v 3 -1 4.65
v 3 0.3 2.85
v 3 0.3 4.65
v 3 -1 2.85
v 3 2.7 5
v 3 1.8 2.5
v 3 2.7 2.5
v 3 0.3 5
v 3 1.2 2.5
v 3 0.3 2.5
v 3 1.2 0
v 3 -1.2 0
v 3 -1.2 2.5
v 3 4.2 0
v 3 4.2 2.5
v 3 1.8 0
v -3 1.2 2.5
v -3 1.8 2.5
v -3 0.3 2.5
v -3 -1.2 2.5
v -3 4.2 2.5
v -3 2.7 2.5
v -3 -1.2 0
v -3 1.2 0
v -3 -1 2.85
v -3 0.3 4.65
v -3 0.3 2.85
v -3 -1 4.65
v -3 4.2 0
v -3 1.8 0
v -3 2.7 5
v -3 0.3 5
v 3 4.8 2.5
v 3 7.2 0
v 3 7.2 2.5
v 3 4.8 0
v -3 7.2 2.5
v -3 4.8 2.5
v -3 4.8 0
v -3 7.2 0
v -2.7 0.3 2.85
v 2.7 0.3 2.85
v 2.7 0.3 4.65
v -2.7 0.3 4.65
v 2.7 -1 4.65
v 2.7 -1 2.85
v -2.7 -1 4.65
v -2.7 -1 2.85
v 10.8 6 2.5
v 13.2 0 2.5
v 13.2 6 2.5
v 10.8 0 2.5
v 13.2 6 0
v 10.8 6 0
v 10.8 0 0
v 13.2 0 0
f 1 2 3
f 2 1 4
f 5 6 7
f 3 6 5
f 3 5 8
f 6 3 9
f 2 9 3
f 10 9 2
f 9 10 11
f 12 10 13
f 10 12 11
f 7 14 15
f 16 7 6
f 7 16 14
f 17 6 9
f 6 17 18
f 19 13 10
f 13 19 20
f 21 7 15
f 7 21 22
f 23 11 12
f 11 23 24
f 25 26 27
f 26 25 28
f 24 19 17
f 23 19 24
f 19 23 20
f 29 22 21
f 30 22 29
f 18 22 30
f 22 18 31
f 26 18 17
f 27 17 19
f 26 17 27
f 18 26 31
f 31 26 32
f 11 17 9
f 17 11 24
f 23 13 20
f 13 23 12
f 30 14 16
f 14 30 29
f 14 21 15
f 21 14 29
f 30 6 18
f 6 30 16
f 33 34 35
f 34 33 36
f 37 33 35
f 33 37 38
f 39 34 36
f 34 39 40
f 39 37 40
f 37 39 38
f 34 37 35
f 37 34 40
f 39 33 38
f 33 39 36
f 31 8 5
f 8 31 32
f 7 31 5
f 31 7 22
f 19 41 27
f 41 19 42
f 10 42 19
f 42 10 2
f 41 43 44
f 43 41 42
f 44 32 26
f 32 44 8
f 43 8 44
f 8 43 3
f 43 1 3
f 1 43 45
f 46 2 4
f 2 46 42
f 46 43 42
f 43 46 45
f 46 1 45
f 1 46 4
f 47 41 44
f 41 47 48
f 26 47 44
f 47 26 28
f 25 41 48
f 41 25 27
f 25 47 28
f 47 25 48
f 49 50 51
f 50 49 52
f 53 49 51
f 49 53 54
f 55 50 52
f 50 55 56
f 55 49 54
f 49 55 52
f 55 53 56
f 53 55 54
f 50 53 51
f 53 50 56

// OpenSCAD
// 集装箱堆 (battle_container) — 枪战掩体资产
// 标准货柜尺寸，颜色区分，可堆叠，提供模块化掩护
$fn = 6;

module container(len, h, col, pos) {
  color(col) translate(pos) cube([len, 2.4, h], center = true);
  // 端部门框
  color([0.10, 0.10, 0.10]) translate([pos[0] + len/2 - 0.15, 0, pos[2]]) cube([0.3, 2.0, 1.8], center = true);
  color([0.10, 0.10, 0.10]) translate([pos[0] - len/2 + 0.15, 0, pos[2]]) cube([0.3, 2.0, 1.8], center = true);
}

module containers() {
  // 底层三连
  container(6, 2.5, [0.70, 0.25, 0.20], [0, 0, 1.25]);
  container(6, 2.5, [0.20, 0.40, 0.65], [0, 3, 1.25]);
  container(6, 2.5, [0.80, 0.70, 0.20], [0, 6, 1.25]);
  // 上面叠一个
  container(6, 2.5, [0.30, 0.55, 0.30], [0, 1.5, 3.75]);
  // 侧翻一个
  color([0.55, 0.30, 0.55]) translate([12, 3, 1.25]) rotate([0, 0, 90]) cube([6, 2.4, 2.5], center = true);
}

containers();
